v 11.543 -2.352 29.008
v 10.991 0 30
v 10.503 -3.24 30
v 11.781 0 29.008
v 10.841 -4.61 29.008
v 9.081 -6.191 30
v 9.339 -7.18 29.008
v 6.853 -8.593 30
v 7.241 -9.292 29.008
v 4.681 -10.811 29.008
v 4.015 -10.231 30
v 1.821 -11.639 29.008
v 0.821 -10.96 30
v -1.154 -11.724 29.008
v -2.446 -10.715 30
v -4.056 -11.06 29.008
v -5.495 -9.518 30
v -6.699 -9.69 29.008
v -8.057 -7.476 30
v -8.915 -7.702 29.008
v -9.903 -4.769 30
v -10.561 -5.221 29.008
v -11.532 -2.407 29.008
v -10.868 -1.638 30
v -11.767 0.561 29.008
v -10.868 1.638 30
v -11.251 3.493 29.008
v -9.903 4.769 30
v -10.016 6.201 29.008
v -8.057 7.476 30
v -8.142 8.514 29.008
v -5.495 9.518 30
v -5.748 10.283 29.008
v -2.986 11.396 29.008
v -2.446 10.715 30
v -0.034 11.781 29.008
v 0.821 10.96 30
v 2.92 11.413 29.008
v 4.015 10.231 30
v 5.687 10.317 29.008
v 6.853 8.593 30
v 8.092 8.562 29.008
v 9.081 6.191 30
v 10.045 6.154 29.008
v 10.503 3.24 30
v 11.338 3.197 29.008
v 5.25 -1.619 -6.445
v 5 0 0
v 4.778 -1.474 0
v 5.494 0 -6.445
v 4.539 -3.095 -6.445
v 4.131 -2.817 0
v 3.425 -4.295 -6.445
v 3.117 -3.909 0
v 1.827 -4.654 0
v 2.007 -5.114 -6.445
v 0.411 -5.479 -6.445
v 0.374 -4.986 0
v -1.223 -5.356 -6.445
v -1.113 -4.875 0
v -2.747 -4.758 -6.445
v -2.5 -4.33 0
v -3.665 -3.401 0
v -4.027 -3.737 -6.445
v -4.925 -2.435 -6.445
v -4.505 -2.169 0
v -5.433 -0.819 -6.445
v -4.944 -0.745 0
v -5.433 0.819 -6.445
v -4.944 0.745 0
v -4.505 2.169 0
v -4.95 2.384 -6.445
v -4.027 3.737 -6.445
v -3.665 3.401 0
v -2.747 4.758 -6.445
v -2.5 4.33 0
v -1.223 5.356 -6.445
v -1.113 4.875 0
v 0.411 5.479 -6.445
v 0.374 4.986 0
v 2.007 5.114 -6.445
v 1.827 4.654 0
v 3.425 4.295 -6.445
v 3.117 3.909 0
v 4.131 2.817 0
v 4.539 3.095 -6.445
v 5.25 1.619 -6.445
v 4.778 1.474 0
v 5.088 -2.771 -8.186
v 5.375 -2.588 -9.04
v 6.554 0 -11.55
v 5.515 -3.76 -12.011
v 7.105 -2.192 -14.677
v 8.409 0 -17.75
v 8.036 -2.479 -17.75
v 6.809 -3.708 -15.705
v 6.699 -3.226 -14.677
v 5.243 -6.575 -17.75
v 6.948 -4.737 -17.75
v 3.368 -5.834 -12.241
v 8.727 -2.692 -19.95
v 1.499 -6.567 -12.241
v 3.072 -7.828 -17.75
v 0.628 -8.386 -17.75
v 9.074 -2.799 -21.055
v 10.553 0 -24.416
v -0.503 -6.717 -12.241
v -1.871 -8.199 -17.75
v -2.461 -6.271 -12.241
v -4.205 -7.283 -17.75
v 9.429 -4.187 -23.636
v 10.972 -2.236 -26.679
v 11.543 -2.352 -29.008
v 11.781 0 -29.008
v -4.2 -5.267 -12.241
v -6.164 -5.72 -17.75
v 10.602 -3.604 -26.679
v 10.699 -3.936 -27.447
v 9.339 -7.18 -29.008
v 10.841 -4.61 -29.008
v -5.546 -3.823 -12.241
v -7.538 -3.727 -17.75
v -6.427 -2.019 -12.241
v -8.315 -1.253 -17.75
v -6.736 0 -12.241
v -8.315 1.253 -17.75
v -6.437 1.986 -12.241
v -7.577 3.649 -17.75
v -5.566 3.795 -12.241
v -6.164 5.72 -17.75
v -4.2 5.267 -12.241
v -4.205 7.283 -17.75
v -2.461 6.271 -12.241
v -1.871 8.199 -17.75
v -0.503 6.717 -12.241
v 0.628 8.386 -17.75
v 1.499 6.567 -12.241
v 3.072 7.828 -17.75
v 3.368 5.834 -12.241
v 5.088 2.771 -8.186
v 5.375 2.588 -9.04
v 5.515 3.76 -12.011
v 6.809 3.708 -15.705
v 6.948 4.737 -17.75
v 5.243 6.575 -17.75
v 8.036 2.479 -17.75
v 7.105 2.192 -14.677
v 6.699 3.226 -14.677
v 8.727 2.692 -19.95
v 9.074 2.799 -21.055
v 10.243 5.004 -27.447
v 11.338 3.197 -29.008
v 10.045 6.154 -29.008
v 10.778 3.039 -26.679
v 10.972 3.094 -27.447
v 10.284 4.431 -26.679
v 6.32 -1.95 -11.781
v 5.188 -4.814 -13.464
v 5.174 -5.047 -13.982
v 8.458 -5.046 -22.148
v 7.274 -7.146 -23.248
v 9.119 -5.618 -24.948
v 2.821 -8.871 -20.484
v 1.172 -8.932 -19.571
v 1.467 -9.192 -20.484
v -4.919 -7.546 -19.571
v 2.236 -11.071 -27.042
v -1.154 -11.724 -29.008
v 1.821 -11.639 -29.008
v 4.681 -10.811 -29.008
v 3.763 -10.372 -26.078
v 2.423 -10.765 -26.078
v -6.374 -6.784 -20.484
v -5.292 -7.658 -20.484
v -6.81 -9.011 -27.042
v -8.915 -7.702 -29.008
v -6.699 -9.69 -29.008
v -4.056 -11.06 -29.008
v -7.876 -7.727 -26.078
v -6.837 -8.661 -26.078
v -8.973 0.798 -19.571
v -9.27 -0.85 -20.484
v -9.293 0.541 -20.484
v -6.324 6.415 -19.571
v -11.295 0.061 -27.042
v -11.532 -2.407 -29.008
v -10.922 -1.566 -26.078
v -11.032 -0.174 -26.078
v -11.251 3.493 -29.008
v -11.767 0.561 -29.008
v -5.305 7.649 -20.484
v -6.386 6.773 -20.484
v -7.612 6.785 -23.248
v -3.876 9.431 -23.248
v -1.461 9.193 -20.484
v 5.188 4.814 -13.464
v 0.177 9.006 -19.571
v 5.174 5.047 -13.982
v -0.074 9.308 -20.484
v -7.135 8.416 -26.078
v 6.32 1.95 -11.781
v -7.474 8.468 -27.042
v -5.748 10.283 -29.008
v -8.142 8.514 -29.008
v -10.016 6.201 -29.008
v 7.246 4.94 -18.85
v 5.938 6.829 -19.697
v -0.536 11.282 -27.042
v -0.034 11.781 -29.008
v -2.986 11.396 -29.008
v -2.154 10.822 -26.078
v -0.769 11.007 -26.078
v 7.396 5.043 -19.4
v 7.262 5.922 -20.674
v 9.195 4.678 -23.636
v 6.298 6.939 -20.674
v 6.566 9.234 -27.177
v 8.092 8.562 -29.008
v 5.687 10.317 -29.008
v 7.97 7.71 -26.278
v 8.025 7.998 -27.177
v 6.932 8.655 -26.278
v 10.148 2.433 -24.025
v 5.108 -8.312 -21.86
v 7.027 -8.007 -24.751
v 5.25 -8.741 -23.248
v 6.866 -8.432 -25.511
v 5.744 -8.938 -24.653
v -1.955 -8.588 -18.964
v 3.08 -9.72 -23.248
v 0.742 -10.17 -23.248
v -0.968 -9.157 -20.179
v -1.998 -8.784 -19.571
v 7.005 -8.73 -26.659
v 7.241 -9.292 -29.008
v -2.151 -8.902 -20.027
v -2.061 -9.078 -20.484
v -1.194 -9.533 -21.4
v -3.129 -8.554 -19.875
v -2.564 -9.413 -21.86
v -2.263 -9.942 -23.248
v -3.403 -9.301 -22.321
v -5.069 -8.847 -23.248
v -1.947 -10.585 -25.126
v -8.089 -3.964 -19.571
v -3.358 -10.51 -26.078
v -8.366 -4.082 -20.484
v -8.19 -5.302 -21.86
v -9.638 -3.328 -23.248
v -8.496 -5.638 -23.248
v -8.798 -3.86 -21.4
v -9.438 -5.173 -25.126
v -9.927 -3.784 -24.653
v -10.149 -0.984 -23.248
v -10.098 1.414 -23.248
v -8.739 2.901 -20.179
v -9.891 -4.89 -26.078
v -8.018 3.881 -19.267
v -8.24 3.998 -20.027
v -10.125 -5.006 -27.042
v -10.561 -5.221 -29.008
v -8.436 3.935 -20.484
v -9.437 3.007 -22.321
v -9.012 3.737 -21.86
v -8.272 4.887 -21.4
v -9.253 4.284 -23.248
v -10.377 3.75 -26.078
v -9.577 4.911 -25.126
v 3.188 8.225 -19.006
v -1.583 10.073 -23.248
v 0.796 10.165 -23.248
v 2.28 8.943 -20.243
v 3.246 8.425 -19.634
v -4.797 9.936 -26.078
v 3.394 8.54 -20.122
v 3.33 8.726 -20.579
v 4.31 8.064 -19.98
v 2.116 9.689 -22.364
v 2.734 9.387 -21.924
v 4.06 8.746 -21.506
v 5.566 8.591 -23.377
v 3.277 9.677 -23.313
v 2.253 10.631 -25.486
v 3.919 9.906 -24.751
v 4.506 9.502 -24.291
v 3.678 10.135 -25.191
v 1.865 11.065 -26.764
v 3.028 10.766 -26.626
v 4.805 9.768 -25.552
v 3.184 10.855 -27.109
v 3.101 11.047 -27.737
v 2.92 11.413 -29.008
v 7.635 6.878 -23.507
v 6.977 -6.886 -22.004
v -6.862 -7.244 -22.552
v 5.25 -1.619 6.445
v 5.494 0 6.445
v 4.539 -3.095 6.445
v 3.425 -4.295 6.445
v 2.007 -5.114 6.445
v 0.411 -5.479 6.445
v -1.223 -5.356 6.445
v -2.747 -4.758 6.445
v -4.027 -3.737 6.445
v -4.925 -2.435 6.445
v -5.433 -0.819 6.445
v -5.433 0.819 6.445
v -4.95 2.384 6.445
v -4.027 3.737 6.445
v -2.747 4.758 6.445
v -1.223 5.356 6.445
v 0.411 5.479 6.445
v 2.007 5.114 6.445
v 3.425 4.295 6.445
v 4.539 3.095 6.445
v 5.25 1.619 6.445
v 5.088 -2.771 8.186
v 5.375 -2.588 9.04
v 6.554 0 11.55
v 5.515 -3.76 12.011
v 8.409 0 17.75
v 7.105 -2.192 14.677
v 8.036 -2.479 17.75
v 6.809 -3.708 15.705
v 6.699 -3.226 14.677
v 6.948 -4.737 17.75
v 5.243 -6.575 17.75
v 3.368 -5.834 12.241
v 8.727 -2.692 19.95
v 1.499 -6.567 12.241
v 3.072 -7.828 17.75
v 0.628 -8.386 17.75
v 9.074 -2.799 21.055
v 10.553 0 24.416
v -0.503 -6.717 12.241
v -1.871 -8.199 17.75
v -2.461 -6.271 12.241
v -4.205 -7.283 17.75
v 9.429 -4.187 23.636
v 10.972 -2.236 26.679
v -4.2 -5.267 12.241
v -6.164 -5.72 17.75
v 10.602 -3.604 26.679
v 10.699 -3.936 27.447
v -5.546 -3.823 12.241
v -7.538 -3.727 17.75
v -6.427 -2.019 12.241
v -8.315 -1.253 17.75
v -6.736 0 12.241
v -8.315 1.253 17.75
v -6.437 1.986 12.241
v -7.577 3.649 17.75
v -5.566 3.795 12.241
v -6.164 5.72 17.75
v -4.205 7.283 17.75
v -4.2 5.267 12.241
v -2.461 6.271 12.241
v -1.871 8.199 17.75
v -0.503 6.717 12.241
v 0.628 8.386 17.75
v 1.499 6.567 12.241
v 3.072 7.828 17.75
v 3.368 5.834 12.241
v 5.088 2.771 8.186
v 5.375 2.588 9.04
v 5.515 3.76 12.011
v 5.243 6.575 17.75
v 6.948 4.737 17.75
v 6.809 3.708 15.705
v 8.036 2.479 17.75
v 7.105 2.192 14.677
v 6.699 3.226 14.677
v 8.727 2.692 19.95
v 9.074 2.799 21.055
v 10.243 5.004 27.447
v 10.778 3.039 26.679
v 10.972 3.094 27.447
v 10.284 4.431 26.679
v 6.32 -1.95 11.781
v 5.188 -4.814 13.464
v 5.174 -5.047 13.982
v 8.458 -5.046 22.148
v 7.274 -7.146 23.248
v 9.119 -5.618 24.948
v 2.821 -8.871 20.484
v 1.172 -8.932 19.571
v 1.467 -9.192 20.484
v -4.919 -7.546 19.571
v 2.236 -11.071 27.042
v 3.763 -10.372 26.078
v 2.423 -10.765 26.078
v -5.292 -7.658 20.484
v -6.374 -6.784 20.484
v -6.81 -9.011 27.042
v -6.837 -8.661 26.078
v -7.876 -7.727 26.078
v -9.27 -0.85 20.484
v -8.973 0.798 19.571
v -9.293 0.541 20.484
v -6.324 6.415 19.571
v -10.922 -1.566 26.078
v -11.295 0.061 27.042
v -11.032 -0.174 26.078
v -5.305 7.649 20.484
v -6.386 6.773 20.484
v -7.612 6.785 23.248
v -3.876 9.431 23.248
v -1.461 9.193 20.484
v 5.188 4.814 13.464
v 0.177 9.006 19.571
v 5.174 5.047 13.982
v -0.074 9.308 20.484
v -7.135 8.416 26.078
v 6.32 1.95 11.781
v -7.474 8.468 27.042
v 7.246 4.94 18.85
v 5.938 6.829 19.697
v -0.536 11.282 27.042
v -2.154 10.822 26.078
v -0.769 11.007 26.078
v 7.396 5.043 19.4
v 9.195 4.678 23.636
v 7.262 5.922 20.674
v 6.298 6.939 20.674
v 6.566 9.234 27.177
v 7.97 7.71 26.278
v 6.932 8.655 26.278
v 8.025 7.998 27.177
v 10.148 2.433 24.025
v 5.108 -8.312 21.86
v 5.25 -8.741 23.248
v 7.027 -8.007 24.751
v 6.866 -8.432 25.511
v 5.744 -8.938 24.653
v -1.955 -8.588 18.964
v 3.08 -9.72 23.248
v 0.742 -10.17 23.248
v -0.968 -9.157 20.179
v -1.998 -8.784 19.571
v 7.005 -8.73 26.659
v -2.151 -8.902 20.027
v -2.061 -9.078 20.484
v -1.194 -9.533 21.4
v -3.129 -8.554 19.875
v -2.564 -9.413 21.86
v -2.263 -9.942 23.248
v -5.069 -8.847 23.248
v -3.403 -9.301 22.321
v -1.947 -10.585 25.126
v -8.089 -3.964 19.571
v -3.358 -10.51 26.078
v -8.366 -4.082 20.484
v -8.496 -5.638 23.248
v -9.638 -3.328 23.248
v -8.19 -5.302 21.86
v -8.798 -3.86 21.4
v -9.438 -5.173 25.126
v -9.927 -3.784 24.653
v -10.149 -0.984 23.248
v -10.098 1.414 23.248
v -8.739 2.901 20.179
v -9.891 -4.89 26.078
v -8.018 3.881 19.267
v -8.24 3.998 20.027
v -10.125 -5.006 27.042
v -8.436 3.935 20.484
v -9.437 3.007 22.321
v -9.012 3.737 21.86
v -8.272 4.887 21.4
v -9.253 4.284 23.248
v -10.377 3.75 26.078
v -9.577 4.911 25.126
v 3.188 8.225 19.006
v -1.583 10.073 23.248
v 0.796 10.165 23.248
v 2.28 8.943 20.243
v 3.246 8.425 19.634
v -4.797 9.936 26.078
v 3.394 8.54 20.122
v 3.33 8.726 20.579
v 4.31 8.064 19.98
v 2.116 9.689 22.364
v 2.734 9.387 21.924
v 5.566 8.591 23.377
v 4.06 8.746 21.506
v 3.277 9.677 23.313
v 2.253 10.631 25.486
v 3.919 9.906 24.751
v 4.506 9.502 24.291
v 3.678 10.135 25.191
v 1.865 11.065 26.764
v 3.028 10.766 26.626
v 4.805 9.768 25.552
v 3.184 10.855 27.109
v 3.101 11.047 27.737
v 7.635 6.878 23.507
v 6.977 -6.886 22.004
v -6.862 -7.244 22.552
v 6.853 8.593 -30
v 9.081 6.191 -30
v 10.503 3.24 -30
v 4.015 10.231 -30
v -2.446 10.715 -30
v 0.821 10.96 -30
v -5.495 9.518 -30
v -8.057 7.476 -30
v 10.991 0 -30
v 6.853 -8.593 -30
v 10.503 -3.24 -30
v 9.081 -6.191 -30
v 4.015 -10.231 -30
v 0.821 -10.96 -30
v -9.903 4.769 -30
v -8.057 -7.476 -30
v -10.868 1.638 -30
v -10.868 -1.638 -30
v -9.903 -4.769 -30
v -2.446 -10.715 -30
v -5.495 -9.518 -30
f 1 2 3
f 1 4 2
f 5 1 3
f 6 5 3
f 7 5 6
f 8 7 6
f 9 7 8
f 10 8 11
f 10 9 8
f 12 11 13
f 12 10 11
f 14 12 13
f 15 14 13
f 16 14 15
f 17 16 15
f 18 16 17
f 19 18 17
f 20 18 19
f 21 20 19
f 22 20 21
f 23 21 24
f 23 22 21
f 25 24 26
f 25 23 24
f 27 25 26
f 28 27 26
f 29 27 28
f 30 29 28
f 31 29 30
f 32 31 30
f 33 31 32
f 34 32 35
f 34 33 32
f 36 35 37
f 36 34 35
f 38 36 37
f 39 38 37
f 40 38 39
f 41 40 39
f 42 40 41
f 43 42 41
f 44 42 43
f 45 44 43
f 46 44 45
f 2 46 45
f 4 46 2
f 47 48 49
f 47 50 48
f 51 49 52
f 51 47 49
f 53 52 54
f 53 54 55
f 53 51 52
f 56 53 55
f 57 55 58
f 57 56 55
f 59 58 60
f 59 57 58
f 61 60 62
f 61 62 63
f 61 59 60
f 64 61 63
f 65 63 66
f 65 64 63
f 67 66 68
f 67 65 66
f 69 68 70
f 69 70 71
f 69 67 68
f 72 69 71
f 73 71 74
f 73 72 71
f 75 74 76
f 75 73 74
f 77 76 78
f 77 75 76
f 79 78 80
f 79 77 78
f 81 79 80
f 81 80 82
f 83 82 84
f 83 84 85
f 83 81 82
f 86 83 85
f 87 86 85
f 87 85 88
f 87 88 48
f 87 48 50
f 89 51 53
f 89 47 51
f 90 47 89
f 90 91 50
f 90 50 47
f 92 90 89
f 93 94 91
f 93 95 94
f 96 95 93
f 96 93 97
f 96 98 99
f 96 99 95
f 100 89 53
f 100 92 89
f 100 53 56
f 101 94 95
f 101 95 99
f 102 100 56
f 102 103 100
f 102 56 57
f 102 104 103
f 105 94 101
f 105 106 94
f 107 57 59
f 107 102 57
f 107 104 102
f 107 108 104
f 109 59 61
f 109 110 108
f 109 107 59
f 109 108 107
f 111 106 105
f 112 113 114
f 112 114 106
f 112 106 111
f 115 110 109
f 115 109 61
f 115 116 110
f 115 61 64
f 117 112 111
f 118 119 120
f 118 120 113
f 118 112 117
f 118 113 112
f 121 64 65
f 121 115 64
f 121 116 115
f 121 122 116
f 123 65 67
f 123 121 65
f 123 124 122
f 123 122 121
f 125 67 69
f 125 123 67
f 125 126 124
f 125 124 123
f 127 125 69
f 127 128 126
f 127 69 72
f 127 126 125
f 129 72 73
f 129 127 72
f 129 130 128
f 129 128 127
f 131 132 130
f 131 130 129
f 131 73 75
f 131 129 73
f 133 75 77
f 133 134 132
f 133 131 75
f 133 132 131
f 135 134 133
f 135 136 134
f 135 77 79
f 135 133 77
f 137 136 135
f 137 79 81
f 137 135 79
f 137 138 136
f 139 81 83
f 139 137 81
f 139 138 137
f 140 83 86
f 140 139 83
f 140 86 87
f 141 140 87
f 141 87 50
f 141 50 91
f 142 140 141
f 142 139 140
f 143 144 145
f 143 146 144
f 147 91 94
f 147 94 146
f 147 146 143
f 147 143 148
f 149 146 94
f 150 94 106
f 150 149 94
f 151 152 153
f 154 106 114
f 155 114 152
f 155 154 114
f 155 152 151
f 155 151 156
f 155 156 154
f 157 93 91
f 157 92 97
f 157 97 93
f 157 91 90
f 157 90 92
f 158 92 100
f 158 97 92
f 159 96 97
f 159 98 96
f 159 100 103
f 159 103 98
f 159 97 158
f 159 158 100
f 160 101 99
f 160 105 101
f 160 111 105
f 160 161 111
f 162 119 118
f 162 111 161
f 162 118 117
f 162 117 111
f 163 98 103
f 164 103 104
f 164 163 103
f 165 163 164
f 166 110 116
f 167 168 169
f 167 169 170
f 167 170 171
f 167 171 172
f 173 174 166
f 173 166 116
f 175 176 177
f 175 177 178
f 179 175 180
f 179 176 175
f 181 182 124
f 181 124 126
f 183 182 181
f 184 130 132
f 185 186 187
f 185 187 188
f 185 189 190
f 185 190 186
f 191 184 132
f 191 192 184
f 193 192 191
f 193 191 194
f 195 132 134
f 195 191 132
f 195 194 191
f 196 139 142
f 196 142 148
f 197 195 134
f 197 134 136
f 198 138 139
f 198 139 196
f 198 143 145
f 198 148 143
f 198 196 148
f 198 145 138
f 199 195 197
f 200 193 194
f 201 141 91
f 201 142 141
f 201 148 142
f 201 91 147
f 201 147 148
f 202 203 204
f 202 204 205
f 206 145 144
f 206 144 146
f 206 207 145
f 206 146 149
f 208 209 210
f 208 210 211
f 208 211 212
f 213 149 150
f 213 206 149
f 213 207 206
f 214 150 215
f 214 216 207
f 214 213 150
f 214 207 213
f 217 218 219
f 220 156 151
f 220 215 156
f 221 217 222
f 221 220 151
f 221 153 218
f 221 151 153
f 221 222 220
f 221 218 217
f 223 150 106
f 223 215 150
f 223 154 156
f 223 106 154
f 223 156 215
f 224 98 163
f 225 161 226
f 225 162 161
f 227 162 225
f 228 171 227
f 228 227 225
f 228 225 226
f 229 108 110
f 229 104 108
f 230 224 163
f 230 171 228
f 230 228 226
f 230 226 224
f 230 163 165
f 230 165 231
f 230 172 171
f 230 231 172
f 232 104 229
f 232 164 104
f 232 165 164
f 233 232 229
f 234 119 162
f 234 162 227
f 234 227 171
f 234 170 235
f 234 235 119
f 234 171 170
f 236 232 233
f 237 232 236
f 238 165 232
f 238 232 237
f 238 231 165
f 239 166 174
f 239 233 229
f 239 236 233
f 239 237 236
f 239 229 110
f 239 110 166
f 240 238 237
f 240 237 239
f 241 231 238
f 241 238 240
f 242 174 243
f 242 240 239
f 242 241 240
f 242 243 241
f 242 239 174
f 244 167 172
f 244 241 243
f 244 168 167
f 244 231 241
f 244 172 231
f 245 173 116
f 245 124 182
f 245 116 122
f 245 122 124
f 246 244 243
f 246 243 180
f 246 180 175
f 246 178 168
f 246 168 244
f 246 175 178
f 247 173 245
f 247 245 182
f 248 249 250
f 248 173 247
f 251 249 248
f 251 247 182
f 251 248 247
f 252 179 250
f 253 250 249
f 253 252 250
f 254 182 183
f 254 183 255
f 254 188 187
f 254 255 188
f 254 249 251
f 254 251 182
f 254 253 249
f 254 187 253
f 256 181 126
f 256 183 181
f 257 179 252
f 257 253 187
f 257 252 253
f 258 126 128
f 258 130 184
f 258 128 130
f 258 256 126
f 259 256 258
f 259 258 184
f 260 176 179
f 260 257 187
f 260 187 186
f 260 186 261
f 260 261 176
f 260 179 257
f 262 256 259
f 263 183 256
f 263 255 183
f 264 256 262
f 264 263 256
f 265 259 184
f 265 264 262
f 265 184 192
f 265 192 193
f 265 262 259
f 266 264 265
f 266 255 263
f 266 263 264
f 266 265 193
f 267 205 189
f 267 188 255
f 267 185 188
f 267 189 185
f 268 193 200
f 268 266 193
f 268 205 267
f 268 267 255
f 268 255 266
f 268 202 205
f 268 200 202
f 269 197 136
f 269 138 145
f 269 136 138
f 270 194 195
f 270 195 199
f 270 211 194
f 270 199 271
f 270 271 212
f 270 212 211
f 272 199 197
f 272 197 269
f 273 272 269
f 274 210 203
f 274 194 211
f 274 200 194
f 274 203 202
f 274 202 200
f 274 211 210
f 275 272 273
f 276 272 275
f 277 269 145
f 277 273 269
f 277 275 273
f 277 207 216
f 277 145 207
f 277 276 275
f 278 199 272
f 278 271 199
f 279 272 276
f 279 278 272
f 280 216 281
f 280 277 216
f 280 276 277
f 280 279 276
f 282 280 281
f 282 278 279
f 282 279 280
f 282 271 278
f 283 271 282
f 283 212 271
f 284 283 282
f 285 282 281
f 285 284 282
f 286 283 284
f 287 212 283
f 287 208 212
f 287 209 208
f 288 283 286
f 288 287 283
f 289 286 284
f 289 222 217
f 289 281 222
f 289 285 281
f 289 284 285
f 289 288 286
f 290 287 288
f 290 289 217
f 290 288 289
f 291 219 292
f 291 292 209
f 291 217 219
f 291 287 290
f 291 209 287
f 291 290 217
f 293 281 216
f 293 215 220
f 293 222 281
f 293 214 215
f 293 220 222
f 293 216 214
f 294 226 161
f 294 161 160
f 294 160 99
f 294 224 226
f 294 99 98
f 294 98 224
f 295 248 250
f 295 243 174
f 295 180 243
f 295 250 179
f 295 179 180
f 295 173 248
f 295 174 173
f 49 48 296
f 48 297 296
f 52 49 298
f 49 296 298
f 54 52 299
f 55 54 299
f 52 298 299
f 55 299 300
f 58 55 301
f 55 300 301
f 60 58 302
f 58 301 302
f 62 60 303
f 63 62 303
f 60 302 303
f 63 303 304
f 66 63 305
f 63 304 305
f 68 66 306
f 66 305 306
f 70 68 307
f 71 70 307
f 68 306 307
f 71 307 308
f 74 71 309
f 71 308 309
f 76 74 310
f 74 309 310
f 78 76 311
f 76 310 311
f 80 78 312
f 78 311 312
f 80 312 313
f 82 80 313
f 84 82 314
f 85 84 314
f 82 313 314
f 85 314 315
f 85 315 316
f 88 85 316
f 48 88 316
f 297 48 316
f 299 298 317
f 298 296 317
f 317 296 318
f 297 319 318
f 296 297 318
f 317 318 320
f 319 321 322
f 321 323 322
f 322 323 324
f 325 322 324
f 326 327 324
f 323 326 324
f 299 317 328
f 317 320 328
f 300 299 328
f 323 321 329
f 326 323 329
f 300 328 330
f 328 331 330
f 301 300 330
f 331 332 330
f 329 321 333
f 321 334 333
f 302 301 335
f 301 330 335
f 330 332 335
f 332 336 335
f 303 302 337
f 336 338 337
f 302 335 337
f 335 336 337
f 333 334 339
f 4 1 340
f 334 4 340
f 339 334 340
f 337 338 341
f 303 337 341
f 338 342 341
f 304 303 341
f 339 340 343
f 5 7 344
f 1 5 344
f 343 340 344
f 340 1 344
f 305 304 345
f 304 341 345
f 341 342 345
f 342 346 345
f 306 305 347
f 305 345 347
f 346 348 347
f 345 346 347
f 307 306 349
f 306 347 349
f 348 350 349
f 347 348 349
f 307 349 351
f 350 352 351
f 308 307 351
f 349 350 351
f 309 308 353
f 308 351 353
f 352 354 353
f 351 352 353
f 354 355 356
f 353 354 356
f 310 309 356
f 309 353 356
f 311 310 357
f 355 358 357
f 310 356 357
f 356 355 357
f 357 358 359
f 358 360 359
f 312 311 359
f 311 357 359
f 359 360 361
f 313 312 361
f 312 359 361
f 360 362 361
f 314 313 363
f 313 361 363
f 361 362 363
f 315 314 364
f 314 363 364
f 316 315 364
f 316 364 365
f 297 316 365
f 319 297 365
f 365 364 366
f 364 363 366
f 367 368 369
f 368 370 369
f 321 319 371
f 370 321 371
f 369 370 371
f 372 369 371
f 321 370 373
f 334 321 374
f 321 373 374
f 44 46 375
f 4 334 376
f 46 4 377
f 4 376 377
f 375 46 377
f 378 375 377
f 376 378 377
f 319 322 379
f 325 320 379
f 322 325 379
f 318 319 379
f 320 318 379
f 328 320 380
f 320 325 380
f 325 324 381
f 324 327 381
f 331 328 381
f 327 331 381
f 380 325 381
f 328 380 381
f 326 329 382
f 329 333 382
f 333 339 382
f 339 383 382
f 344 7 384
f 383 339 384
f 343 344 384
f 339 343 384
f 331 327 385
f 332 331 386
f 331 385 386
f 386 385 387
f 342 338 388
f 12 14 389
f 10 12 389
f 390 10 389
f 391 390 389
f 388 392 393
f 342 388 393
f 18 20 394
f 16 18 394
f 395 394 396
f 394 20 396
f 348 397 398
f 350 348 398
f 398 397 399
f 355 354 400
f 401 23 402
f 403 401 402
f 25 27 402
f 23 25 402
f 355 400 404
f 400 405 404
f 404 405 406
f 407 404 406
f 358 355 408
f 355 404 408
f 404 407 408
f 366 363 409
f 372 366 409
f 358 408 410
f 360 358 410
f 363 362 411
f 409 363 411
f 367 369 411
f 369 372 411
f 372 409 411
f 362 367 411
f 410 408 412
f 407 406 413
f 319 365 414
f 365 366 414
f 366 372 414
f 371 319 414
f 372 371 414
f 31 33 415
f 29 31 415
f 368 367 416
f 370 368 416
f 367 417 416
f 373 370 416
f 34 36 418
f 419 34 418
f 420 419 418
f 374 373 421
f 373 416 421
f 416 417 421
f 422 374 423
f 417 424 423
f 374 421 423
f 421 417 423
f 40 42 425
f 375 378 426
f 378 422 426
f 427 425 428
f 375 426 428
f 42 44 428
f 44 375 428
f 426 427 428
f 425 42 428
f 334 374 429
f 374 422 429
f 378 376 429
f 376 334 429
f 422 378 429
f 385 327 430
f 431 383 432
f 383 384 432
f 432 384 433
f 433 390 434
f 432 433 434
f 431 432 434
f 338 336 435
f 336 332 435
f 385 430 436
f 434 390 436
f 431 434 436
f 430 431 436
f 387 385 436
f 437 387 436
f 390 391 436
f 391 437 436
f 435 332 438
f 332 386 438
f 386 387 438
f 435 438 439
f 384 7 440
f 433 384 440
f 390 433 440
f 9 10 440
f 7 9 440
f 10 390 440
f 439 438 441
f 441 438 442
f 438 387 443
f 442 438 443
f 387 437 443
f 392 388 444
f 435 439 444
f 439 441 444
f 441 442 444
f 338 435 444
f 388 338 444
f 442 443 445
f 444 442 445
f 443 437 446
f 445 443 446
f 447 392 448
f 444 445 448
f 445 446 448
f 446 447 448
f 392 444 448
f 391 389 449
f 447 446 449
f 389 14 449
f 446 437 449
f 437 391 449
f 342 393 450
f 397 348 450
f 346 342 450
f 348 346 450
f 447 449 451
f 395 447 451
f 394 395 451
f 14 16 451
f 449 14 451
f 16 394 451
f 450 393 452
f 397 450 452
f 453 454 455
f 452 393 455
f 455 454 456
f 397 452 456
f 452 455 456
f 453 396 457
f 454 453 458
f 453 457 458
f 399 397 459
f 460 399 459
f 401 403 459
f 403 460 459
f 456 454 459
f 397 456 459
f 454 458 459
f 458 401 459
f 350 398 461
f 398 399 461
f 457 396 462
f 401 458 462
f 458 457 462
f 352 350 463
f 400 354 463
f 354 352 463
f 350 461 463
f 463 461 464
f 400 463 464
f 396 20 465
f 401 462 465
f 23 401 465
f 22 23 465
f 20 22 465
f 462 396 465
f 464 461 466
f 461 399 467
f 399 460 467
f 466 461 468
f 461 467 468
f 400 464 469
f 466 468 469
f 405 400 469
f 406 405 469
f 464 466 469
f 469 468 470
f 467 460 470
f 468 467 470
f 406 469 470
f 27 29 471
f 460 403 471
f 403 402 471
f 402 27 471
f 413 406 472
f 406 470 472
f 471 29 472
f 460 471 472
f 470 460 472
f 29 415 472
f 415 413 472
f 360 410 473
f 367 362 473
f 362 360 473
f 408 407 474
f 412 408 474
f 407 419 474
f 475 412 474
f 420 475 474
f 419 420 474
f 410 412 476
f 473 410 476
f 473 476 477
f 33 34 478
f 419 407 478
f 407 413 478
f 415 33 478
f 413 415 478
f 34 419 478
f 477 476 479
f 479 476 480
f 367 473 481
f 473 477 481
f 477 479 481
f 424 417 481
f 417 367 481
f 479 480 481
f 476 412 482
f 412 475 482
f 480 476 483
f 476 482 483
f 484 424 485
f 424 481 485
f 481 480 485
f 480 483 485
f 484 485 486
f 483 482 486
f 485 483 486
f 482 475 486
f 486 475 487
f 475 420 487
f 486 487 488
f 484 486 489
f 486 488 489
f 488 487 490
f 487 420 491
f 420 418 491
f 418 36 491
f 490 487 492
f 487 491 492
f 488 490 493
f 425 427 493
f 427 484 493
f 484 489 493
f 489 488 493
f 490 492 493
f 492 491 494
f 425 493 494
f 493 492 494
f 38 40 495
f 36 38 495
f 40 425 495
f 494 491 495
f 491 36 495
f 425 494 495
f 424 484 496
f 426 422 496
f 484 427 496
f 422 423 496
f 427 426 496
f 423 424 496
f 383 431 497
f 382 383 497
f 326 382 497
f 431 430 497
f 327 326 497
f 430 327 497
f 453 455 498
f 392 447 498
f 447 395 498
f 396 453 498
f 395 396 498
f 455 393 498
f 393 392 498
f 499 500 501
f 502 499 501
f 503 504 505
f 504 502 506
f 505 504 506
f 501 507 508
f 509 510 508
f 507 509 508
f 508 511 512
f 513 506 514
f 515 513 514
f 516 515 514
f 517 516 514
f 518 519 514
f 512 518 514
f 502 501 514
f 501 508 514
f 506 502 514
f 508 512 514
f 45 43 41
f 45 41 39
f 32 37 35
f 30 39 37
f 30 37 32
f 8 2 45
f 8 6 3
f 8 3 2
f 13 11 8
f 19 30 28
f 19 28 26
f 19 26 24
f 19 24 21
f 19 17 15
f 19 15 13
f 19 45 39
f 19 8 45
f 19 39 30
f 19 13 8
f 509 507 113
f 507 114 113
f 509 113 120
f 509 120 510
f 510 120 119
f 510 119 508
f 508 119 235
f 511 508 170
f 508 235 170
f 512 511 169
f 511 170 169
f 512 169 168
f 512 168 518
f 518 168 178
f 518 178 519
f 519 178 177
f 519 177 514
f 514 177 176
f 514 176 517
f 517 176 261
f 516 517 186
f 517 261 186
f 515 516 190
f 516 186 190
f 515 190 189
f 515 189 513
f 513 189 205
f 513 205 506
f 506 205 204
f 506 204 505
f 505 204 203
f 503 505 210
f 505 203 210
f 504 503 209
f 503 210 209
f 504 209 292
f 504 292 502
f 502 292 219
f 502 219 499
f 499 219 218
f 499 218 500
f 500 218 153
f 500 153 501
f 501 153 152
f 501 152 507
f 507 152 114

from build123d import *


# Not quite as in the source:
# - a fillet or chamfer that OpenCascade refuses, or shapes differently, is made with other operations: its cross-section is extruded or revolved along the edge and cut away or added


with BuildPart() as f1:
    # F0 (on Front) → F1 (revolve)
    with BuildSketch(Plane.XZ):
        with BuildLine():
            Line((0, 0), (0, -30))
            Line((0, -30), (12, -30))
            add(Edge.make_bspline(
                [(5, 0), (5, -11.6286956261), (9.7787035629, -19.5170734078), (12, -30)],
                knots=[0, 0, 0, 0, 30.8058436015, 30.8058436015, 30.8058436015, 30.8058436015], degree=3))
            Line((5, 0), (0, 0))
        make_face()
    revolve(axis=Axis((0, 0, -15), (0, 0, -1)))

    # F2: chamfer of 1 on 1 edges, made by hand

    # F2_s1 → F2_t2 (revolve, cut)
    with BuildSketch(Plane.XZ):
        with BuildLine():
            Line((10.966073896, -30.0312962065), (11.8055530365, -28.9766322442))
            Line((11.8055530365, -28.9766322442), (11.8250433673, -28.9721459307))
            ThreePointArc((11.8250433673, -28.9721459307), (11.9092913241, -29.4868738611), (12.0195655741, -29.9958541215))
            Line((12.0195655741, -29.9958541215), (12, -30.02))
            ThreePointArc((12, -30.02), (11.483036948, -30.02), (10.966073896, -30.0512962065))
            Line((10.966073896, -30.0512962065), (10.966073896, -30.0312962065))
        make_face()
    revolve(axis=Axis((0, 0, -30), (0, 0, -1)), mode=Mode.SUBTRACT)

    # F3: F1 across plane


with BuildPart() as f1_1:
    add(f1.part)
    add(f1.part.mirror(Plane.XY))


solid = f1_1.part
